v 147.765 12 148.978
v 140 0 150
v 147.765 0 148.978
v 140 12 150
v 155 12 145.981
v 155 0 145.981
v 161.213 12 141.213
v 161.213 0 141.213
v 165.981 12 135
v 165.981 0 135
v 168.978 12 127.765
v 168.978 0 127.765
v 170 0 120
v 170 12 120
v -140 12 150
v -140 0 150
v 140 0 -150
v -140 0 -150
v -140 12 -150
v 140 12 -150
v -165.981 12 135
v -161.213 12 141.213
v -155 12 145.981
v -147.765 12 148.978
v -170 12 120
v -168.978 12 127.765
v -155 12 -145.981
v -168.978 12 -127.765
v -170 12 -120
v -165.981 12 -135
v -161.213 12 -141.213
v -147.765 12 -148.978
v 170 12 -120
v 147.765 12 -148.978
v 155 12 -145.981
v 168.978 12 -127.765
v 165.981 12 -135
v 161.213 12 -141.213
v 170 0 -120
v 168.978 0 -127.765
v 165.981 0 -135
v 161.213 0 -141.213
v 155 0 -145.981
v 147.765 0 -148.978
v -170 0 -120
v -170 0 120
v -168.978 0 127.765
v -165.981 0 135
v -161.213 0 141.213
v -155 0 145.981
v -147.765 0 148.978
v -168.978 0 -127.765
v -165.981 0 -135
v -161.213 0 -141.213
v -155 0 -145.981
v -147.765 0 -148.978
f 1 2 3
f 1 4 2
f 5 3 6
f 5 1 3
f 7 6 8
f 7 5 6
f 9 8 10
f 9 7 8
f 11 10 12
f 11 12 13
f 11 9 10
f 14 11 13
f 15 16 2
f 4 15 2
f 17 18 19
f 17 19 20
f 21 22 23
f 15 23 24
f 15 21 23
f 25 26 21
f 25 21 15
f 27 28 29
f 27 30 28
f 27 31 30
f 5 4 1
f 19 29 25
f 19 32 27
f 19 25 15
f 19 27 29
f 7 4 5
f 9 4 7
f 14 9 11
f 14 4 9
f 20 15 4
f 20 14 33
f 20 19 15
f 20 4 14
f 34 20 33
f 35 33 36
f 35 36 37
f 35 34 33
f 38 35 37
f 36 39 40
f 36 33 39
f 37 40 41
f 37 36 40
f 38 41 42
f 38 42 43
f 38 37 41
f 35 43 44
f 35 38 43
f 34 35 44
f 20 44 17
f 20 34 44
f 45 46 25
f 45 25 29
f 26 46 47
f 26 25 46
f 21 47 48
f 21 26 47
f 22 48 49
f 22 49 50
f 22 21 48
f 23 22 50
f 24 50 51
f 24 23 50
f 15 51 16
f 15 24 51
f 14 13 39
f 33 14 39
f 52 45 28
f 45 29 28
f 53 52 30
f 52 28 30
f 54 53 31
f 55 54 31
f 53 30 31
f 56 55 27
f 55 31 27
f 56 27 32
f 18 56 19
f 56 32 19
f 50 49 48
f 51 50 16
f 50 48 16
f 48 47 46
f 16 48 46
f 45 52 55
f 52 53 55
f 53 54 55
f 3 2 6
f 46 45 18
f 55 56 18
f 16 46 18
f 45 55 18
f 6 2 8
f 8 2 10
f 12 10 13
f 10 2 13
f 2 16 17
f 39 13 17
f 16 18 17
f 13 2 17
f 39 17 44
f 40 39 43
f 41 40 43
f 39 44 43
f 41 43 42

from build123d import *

# Parameters (mm, degrees)
ESBO_O1_W                = 340
ESBO_O1_H                = 300
RESSALTO_EXTRUS_O1_DEPTH = 12
FILETE1_R                = 30


with BuildPart() as part:
    # Esboço1 → Ressalto-extrusão1 (new body)
    with BuildSketch(Plane(origin=(0, 0, 0), x_dir=(1, 0, 0), z_dir=(0, 1, 0))):
        Rectangle(ESBO_O1_W, ESBO_O1_H)
    extrude(amount=RESSALTO_EXTRUS_O1_DEPTH)

    # Filete1
    filete1_edges = [part.edges().sort_by_distance(p)[0] for p in [
        (170, 6, 150),
        (-170, 6, 150),
        (-170, 6, -150),
        (170, 6, -150),
    ]]
    fillet(filete1_edges, radius=FILETE1_R)


solid = part.part
